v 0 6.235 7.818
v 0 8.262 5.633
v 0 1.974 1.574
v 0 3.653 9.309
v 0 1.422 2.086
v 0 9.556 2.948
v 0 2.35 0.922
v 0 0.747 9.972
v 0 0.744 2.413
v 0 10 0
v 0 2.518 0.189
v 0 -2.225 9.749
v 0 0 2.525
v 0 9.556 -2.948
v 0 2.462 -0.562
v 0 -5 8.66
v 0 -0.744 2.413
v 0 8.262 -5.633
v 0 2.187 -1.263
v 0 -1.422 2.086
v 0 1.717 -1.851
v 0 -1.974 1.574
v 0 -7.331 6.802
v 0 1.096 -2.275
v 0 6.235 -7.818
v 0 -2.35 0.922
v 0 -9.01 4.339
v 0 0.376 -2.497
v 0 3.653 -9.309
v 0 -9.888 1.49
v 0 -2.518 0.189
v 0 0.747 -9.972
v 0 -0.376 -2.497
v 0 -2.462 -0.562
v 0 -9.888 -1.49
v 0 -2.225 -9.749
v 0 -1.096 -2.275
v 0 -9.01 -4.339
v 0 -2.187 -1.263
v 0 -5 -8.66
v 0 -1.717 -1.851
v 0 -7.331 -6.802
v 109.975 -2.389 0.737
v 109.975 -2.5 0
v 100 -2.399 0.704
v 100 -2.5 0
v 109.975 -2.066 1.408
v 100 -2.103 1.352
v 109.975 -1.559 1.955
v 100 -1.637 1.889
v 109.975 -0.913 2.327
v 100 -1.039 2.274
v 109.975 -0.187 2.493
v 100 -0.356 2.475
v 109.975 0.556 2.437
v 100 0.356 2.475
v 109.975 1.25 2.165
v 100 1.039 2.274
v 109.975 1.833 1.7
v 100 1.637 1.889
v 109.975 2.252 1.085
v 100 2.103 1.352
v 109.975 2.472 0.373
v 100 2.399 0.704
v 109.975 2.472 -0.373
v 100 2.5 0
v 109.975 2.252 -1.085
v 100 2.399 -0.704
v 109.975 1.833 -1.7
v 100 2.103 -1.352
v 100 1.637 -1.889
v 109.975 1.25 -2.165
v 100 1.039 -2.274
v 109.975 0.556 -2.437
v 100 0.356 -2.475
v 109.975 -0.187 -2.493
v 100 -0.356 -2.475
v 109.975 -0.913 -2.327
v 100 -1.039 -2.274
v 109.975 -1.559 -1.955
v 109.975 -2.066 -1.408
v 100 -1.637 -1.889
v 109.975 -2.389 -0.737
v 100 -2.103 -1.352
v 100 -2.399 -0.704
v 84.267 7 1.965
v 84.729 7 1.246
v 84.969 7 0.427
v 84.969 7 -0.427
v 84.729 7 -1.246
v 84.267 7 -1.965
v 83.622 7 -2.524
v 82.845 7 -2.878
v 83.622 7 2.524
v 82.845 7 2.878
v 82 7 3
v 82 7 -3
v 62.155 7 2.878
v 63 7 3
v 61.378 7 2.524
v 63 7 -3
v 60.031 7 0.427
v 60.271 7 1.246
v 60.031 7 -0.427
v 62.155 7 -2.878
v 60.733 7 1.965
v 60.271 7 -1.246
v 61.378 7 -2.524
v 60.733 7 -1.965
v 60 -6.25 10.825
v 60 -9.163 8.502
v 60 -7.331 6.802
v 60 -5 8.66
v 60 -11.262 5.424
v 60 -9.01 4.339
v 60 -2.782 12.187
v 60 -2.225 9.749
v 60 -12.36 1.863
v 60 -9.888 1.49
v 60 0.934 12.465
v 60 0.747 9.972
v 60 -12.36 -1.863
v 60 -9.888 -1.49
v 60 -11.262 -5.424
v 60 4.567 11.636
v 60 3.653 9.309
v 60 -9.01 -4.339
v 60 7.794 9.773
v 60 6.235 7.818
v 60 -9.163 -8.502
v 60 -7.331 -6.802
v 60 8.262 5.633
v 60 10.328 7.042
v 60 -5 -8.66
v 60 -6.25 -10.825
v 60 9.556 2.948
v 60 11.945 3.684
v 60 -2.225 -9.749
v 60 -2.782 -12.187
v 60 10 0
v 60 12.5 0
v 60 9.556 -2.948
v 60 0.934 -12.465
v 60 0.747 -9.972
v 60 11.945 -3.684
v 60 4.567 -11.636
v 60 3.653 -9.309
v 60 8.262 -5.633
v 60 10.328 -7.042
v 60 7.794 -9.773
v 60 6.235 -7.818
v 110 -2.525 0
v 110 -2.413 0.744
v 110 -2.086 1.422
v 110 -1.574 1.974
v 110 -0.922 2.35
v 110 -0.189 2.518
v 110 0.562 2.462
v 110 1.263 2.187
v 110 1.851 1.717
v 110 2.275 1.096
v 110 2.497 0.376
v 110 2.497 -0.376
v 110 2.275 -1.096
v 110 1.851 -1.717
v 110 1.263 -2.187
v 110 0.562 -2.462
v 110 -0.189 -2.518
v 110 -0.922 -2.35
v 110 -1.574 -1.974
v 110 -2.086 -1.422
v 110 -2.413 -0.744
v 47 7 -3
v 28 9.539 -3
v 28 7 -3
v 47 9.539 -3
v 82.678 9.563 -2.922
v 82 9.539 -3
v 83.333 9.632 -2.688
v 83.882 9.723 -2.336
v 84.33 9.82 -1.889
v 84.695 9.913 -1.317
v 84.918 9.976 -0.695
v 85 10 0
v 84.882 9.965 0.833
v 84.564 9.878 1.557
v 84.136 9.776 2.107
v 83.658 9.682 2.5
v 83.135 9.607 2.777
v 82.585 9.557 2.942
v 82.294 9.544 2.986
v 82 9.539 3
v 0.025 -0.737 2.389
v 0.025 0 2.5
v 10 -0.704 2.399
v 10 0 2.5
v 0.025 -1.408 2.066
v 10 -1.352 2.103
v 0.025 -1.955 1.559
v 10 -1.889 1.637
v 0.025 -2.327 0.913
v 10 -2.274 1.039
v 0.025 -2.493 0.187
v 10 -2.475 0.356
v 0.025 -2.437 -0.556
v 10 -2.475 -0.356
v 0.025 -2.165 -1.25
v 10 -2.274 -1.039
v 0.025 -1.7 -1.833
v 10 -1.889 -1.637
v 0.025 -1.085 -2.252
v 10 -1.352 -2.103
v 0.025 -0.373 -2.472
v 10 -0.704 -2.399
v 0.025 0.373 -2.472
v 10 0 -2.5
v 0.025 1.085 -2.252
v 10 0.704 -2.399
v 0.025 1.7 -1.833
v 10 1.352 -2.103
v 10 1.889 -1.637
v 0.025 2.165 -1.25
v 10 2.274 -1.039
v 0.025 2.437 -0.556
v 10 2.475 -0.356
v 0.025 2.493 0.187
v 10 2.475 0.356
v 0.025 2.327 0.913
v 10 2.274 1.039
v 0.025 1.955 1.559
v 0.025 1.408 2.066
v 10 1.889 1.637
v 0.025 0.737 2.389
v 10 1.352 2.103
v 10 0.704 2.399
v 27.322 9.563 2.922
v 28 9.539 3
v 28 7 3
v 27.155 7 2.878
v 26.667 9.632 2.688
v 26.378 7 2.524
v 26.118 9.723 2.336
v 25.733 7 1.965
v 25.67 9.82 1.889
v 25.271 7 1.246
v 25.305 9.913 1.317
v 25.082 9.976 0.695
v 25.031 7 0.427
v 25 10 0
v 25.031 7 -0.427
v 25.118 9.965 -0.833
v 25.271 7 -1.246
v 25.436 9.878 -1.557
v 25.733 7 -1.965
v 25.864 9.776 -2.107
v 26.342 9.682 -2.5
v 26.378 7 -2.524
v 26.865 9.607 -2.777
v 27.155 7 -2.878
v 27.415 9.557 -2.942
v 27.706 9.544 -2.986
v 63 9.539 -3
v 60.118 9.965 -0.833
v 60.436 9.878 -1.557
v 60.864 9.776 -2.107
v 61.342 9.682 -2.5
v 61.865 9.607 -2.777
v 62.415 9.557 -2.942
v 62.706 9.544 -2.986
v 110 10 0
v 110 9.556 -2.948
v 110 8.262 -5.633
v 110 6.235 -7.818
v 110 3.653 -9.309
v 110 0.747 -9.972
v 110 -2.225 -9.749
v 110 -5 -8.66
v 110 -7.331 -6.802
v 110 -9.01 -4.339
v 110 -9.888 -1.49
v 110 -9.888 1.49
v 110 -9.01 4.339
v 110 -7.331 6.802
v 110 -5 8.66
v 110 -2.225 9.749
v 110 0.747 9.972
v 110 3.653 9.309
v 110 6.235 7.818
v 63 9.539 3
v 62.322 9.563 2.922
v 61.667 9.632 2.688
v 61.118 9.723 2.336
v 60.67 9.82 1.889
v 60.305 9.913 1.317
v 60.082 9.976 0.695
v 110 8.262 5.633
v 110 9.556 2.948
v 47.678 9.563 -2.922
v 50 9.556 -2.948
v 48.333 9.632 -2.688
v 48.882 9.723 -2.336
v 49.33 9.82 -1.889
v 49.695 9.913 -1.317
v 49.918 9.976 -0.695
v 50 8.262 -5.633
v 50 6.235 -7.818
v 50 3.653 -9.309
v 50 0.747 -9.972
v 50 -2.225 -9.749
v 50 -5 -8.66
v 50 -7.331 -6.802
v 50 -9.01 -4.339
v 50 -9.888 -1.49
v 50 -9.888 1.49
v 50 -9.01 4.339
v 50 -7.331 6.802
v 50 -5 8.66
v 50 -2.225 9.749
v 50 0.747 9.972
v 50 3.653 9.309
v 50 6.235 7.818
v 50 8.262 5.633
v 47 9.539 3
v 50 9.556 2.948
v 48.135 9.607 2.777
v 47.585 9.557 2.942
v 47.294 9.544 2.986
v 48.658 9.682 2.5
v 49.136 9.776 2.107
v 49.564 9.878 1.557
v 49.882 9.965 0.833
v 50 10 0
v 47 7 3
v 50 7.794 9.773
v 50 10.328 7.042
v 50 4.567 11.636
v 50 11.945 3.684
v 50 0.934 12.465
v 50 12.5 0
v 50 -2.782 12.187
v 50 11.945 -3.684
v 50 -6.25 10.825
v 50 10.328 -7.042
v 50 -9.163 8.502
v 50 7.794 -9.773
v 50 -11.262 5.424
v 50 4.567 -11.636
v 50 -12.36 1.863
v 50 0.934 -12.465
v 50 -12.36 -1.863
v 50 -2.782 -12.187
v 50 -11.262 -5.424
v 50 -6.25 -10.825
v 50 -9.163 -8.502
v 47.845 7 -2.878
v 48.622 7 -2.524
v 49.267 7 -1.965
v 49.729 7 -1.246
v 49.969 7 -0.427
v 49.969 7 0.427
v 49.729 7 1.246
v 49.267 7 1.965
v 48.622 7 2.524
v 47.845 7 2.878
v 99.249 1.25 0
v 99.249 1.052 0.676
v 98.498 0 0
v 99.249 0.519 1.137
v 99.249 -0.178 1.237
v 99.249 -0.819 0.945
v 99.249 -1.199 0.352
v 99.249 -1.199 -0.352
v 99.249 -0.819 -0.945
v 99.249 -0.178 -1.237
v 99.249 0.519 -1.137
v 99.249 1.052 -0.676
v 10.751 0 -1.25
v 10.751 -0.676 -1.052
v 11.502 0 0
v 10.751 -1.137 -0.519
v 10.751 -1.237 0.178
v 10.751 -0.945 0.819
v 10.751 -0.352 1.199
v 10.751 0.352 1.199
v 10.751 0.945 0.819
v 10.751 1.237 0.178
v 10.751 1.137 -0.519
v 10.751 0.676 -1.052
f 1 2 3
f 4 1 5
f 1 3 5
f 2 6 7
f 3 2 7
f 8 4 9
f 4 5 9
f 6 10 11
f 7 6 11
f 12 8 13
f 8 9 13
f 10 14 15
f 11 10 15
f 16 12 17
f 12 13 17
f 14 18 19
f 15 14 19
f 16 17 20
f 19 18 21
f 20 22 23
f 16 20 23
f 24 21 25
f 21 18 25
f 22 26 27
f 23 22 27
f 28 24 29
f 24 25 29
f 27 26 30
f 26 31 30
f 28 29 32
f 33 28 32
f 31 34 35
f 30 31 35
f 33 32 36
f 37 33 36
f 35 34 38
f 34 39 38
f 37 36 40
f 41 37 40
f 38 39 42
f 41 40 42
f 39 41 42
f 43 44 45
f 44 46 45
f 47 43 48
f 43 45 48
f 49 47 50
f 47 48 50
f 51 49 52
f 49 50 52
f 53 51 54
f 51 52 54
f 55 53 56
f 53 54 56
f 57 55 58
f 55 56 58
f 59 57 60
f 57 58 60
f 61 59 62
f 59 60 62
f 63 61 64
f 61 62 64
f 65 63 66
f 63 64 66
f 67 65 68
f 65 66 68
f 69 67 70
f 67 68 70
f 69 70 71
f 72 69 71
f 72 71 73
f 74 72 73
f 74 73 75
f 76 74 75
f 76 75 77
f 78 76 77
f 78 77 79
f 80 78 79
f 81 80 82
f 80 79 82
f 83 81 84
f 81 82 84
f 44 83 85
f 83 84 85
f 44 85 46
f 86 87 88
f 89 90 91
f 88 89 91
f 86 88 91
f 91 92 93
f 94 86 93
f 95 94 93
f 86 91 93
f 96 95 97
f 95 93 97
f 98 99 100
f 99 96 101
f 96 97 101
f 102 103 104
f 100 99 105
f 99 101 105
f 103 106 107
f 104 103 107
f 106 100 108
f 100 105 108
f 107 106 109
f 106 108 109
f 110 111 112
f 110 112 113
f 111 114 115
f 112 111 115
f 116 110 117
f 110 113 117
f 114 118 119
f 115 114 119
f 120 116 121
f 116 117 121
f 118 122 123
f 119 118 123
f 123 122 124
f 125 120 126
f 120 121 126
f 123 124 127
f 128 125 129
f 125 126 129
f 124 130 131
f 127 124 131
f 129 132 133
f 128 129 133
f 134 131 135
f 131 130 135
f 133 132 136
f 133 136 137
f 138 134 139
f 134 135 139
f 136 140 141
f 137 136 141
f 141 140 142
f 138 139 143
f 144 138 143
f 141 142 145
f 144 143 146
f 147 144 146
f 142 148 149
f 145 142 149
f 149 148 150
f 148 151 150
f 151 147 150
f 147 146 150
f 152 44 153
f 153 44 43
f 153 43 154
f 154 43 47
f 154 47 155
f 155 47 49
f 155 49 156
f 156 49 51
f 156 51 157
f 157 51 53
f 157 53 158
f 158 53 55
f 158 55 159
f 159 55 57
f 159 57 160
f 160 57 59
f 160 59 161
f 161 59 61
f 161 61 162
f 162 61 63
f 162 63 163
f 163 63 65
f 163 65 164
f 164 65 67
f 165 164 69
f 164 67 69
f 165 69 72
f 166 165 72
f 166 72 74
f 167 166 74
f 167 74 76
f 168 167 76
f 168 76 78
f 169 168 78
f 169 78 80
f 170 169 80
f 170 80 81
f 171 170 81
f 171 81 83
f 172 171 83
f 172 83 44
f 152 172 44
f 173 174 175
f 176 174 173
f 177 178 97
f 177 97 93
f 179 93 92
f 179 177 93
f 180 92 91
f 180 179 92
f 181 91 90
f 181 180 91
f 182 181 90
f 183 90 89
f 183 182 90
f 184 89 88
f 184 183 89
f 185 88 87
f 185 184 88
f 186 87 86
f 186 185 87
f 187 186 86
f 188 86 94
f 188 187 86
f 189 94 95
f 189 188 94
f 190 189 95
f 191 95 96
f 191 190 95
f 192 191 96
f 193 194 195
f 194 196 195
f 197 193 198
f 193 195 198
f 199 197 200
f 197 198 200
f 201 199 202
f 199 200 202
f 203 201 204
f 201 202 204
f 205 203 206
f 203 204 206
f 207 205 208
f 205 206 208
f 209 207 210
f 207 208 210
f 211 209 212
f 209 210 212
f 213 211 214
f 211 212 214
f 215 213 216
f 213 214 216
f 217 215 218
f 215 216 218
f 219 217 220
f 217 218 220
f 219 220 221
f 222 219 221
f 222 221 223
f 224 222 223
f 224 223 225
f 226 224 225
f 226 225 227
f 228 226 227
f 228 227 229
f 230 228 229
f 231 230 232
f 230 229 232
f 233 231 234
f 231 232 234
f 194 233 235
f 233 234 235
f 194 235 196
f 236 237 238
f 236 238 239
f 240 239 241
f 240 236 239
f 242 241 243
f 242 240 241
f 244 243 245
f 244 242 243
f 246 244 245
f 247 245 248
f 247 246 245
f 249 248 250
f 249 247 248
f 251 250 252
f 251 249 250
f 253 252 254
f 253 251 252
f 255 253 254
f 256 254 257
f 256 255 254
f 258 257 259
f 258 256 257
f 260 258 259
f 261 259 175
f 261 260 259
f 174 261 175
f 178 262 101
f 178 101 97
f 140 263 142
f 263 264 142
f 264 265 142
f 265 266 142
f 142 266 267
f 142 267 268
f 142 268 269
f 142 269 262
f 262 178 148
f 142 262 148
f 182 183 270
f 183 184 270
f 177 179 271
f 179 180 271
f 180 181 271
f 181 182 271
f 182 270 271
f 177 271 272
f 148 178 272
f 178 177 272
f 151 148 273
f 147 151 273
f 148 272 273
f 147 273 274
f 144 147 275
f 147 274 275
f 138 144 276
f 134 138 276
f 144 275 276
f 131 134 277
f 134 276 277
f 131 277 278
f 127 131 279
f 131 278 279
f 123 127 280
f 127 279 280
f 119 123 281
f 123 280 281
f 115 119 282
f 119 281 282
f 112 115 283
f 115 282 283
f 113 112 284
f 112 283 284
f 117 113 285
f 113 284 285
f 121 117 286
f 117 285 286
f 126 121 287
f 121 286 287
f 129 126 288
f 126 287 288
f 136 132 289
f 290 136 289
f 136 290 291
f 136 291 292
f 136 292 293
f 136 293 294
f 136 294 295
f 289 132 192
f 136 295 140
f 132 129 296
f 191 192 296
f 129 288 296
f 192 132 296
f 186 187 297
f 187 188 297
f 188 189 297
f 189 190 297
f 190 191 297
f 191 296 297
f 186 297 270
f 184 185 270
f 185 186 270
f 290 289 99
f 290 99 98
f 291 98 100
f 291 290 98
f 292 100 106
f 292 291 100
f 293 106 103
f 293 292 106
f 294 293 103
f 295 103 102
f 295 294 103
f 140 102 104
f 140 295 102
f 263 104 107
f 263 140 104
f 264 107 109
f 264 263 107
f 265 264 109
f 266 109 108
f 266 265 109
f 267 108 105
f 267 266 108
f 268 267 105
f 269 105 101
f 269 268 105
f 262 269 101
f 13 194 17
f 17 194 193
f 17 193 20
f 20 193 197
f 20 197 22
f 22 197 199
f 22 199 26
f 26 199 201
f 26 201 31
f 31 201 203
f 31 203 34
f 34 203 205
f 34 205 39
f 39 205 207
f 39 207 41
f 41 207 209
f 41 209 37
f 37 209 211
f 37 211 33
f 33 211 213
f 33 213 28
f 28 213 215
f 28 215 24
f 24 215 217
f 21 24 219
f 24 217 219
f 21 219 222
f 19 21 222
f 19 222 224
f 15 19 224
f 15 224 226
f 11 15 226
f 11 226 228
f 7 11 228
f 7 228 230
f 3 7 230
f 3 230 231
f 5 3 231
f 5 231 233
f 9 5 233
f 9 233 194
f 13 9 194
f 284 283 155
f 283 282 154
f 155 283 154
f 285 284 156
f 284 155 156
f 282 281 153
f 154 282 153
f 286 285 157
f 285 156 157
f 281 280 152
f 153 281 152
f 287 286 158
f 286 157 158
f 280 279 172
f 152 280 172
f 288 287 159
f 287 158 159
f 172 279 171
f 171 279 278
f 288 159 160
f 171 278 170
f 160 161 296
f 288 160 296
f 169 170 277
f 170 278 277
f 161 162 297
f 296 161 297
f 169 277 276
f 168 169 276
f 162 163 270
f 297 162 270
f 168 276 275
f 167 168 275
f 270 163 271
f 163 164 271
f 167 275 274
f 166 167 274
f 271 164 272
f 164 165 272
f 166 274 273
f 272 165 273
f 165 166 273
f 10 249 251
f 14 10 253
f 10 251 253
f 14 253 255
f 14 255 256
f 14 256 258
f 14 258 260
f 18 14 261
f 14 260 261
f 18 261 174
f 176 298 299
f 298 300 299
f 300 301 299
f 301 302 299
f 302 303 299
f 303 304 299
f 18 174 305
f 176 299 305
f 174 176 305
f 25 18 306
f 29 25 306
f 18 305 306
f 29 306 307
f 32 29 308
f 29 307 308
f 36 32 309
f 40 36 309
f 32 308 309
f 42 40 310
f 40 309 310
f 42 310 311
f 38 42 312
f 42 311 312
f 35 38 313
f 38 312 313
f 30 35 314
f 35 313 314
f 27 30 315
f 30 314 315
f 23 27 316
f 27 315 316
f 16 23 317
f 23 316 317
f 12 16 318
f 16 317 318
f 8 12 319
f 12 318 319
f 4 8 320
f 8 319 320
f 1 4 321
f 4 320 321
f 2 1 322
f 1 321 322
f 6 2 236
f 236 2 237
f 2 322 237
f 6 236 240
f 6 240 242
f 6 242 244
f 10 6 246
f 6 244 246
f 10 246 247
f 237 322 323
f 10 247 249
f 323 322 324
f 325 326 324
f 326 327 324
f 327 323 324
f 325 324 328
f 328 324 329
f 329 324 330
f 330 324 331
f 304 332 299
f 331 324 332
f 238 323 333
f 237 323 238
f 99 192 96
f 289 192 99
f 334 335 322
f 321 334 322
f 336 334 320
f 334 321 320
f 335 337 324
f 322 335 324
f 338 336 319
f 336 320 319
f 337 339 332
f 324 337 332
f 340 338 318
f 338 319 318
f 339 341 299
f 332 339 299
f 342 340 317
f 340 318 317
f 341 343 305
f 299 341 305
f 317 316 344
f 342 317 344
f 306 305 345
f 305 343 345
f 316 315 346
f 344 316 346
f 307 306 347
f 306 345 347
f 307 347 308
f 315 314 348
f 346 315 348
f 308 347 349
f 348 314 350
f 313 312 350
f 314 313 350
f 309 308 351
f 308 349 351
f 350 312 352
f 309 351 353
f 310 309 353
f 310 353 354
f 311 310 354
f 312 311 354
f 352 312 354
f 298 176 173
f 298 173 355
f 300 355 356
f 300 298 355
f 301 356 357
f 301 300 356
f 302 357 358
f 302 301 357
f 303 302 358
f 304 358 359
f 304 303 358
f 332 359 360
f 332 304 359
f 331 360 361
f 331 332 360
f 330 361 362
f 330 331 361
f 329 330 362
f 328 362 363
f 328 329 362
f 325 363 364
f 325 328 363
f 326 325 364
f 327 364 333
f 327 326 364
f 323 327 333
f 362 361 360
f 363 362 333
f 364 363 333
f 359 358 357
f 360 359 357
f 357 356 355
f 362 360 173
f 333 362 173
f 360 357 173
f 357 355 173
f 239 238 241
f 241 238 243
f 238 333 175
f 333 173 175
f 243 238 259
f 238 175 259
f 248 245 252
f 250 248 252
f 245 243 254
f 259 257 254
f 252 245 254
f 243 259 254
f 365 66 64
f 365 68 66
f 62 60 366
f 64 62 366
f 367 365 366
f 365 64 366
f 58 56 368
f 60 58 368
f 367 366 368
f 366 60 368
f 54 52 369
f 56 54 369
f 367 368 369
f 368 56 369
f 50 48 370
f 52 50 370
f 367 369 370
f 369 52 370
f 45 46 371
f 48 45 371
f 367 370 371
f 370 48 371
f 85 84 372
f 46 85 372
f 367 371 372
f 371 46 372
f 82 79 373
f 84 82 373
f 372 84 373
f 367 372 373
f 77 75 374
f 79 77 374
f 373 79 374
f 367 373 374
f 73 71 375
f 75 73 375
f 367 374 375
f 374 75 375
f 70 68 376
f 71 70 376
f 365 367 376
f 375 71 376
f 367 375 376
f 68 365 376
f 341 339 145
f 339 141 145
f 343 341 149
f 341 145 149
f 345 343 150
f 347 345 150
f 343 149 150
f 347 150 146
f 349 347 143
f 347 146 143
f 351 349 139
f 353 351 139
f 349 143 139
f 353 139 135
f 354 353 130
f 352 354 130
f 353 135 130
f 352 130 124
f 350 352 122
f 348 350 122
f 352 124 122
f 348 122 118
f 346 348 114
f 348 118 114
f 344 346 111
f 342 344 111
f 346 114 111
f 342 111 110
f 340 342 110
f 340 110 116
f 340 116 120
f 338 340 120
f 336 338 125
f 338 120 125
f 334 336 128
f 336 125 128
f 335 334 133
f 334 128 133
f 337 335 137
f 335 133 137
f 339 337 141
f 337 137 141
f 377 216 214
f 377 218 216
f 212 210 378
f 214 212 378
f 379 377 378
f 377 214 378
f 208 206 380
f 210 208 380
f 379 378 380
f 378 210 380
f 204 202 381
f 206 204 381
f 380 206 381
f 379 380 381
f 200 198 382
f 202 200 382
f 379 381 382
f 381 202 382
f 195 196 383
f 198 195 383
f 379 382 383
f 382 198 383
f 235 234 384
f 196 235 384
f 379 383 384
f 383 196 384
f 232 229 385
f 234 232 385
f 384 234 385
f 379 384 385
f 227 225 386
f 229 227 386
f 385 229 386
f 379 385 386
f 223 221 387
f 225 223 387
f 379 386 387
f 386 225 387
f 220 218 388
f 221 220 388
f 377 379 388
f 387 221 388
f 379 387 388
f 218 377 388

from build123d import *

# Parameters (mm, degrees)
CUT_EXTRUDE1_DEPTH                        = 3
F_5_0MM_DOWEL_HOLE1_D                     = 5
F_5_0MM_DOWEL_HOLE1_DEPTH                 = 10
F_5_0MM_DOWEL_HOLE1_CSINK_D               = 5.05
F_5_0MM_DOWEL_HOLE1_CSINK_ANGLE           = 90
F_5_0MM_DOWEL_HOLE1_TIP                   = 1.502151548
F_5_0MM_DOWEL_HOLE1_ON_FACE_2_D           = 5
F_5_0MM_DOWEL_HOLE1_ON_FACE_2_DEPTH       = 10
F_5_0MM_DOWEL_HOLE1_ON_FACE_2_CSINK_D     = 5.05
F_5_0MM_DOWEL_HOLE1_ON_FACE_2_CSINK_ANGLE = 90
F_5_0MM_DOWEL_HOLE1_ON_FACE_2_TIP         = 1.502151548


with BuildPart() as part:
    # Sketch1 → Revolve1 (revolve)
    with BuildSketch(Plane.XY):
        Polygon((0, 0), (0, 10), (50, 10), (50, 12.5), (60, 12.5), (60, 10), (110, 10), (110, 0), align=None)
    revolve(axis=Axis((110, 0, 0), (-1, 0, 0)))

    # Sketch2 → Cut-Extrude1 (cut)
    with BuildSketch(Plane(origin=(0, 10, 0), x_dir=(1, 0, 0), z_dir=(0, 1, 0))):
        with BuildLine():
            Line((47, -3), (28, -3))
            ThreePointArc((28, -3), (25, 0), (28, 3))
            Line((28, 3), (47, 3))
            ThreePointArc((47, 3), (50, 0), (47, -3))
        make_face()
        with BuildLine():
            Line((63, 3), (82, 3))
            ThreePointArc((82, 3), (85, 0), (82, -3))
            Line((82, -3), (63, -3))
            ThreePointArc((63, -3), (60, 0), (63, 3))
        make_face()
    extrude(amount=-CUT_EXTRUDE1_DEPTH, mode=Mode.SUBTRACT)

    # Ø5.0mm Dowel Hole1
    with Locations(Plane.YZ.offset(110)):
        with Locations((0, 0)):
            CounterSinkHole(F_5_0MM_DOWEL_HOLE1_D / 2, F_5_0MM_DOWEL_HOLE1_CSINK_D / 2, depth=F_5_0MM_DOWEL_HOLE1_DEPTH, counter_sink_angle=F_5_0MM_DOWEL_HOLE1_CSINK_ANGLE)
            with Locations((0, 0, -(F_5_0MM_DOWEL_HOLE1_DEPTH + F_5_0MM_DOWEL_HOLE1_TIP / 2))):  # 118° drill point
                Cone(0, F_5_0MM_DOWEL_HOLE1_D / 2, F_5_0MM_DOWEL_HOLE1_TIP, mode=Mode.SUBTRACT)

    # Ø5.0mm Dowel Hole1 on face 2
    with Locations(Plane(origin=(0, 0, 0), x_dir=(0, 0, -1), z_dir=(-1, 0, 0))):
        with Locations((0, 0)):
            CounterSinkHole(F_5_0MM_DOWEL_HOLE1_ON_FACE_2_D / 2, F_5_0MM_DOWEL_HOLE1_ON_FACE_2_CSINK_D / 2, depth=F_5_0MM_DOWEL_HOLE1_ON_FACE_2_DEPTH, counter_sink_angle=F_5_0MM_DOWEL_HOLE1_ON_FACE_2_CSINK_ANGLE)
            with Locations((0, 0, -(F_5_0MM_DOWEL_HOLE1_ON_FACE_2_DEPTH + F_5_0MM_DOWEL_HOLE1_ON_FACE_2_TIP / 2))):  # 118° drill point
                Cone(0, F_5_0MM_DOWEL_HOLE1_ON_FACE_2_D / 2, F_5_0MM_DOWEL_HOLE1_ON_FACE_2_TIP, mode=Mode.SUBTRACT)


solid = part.part
